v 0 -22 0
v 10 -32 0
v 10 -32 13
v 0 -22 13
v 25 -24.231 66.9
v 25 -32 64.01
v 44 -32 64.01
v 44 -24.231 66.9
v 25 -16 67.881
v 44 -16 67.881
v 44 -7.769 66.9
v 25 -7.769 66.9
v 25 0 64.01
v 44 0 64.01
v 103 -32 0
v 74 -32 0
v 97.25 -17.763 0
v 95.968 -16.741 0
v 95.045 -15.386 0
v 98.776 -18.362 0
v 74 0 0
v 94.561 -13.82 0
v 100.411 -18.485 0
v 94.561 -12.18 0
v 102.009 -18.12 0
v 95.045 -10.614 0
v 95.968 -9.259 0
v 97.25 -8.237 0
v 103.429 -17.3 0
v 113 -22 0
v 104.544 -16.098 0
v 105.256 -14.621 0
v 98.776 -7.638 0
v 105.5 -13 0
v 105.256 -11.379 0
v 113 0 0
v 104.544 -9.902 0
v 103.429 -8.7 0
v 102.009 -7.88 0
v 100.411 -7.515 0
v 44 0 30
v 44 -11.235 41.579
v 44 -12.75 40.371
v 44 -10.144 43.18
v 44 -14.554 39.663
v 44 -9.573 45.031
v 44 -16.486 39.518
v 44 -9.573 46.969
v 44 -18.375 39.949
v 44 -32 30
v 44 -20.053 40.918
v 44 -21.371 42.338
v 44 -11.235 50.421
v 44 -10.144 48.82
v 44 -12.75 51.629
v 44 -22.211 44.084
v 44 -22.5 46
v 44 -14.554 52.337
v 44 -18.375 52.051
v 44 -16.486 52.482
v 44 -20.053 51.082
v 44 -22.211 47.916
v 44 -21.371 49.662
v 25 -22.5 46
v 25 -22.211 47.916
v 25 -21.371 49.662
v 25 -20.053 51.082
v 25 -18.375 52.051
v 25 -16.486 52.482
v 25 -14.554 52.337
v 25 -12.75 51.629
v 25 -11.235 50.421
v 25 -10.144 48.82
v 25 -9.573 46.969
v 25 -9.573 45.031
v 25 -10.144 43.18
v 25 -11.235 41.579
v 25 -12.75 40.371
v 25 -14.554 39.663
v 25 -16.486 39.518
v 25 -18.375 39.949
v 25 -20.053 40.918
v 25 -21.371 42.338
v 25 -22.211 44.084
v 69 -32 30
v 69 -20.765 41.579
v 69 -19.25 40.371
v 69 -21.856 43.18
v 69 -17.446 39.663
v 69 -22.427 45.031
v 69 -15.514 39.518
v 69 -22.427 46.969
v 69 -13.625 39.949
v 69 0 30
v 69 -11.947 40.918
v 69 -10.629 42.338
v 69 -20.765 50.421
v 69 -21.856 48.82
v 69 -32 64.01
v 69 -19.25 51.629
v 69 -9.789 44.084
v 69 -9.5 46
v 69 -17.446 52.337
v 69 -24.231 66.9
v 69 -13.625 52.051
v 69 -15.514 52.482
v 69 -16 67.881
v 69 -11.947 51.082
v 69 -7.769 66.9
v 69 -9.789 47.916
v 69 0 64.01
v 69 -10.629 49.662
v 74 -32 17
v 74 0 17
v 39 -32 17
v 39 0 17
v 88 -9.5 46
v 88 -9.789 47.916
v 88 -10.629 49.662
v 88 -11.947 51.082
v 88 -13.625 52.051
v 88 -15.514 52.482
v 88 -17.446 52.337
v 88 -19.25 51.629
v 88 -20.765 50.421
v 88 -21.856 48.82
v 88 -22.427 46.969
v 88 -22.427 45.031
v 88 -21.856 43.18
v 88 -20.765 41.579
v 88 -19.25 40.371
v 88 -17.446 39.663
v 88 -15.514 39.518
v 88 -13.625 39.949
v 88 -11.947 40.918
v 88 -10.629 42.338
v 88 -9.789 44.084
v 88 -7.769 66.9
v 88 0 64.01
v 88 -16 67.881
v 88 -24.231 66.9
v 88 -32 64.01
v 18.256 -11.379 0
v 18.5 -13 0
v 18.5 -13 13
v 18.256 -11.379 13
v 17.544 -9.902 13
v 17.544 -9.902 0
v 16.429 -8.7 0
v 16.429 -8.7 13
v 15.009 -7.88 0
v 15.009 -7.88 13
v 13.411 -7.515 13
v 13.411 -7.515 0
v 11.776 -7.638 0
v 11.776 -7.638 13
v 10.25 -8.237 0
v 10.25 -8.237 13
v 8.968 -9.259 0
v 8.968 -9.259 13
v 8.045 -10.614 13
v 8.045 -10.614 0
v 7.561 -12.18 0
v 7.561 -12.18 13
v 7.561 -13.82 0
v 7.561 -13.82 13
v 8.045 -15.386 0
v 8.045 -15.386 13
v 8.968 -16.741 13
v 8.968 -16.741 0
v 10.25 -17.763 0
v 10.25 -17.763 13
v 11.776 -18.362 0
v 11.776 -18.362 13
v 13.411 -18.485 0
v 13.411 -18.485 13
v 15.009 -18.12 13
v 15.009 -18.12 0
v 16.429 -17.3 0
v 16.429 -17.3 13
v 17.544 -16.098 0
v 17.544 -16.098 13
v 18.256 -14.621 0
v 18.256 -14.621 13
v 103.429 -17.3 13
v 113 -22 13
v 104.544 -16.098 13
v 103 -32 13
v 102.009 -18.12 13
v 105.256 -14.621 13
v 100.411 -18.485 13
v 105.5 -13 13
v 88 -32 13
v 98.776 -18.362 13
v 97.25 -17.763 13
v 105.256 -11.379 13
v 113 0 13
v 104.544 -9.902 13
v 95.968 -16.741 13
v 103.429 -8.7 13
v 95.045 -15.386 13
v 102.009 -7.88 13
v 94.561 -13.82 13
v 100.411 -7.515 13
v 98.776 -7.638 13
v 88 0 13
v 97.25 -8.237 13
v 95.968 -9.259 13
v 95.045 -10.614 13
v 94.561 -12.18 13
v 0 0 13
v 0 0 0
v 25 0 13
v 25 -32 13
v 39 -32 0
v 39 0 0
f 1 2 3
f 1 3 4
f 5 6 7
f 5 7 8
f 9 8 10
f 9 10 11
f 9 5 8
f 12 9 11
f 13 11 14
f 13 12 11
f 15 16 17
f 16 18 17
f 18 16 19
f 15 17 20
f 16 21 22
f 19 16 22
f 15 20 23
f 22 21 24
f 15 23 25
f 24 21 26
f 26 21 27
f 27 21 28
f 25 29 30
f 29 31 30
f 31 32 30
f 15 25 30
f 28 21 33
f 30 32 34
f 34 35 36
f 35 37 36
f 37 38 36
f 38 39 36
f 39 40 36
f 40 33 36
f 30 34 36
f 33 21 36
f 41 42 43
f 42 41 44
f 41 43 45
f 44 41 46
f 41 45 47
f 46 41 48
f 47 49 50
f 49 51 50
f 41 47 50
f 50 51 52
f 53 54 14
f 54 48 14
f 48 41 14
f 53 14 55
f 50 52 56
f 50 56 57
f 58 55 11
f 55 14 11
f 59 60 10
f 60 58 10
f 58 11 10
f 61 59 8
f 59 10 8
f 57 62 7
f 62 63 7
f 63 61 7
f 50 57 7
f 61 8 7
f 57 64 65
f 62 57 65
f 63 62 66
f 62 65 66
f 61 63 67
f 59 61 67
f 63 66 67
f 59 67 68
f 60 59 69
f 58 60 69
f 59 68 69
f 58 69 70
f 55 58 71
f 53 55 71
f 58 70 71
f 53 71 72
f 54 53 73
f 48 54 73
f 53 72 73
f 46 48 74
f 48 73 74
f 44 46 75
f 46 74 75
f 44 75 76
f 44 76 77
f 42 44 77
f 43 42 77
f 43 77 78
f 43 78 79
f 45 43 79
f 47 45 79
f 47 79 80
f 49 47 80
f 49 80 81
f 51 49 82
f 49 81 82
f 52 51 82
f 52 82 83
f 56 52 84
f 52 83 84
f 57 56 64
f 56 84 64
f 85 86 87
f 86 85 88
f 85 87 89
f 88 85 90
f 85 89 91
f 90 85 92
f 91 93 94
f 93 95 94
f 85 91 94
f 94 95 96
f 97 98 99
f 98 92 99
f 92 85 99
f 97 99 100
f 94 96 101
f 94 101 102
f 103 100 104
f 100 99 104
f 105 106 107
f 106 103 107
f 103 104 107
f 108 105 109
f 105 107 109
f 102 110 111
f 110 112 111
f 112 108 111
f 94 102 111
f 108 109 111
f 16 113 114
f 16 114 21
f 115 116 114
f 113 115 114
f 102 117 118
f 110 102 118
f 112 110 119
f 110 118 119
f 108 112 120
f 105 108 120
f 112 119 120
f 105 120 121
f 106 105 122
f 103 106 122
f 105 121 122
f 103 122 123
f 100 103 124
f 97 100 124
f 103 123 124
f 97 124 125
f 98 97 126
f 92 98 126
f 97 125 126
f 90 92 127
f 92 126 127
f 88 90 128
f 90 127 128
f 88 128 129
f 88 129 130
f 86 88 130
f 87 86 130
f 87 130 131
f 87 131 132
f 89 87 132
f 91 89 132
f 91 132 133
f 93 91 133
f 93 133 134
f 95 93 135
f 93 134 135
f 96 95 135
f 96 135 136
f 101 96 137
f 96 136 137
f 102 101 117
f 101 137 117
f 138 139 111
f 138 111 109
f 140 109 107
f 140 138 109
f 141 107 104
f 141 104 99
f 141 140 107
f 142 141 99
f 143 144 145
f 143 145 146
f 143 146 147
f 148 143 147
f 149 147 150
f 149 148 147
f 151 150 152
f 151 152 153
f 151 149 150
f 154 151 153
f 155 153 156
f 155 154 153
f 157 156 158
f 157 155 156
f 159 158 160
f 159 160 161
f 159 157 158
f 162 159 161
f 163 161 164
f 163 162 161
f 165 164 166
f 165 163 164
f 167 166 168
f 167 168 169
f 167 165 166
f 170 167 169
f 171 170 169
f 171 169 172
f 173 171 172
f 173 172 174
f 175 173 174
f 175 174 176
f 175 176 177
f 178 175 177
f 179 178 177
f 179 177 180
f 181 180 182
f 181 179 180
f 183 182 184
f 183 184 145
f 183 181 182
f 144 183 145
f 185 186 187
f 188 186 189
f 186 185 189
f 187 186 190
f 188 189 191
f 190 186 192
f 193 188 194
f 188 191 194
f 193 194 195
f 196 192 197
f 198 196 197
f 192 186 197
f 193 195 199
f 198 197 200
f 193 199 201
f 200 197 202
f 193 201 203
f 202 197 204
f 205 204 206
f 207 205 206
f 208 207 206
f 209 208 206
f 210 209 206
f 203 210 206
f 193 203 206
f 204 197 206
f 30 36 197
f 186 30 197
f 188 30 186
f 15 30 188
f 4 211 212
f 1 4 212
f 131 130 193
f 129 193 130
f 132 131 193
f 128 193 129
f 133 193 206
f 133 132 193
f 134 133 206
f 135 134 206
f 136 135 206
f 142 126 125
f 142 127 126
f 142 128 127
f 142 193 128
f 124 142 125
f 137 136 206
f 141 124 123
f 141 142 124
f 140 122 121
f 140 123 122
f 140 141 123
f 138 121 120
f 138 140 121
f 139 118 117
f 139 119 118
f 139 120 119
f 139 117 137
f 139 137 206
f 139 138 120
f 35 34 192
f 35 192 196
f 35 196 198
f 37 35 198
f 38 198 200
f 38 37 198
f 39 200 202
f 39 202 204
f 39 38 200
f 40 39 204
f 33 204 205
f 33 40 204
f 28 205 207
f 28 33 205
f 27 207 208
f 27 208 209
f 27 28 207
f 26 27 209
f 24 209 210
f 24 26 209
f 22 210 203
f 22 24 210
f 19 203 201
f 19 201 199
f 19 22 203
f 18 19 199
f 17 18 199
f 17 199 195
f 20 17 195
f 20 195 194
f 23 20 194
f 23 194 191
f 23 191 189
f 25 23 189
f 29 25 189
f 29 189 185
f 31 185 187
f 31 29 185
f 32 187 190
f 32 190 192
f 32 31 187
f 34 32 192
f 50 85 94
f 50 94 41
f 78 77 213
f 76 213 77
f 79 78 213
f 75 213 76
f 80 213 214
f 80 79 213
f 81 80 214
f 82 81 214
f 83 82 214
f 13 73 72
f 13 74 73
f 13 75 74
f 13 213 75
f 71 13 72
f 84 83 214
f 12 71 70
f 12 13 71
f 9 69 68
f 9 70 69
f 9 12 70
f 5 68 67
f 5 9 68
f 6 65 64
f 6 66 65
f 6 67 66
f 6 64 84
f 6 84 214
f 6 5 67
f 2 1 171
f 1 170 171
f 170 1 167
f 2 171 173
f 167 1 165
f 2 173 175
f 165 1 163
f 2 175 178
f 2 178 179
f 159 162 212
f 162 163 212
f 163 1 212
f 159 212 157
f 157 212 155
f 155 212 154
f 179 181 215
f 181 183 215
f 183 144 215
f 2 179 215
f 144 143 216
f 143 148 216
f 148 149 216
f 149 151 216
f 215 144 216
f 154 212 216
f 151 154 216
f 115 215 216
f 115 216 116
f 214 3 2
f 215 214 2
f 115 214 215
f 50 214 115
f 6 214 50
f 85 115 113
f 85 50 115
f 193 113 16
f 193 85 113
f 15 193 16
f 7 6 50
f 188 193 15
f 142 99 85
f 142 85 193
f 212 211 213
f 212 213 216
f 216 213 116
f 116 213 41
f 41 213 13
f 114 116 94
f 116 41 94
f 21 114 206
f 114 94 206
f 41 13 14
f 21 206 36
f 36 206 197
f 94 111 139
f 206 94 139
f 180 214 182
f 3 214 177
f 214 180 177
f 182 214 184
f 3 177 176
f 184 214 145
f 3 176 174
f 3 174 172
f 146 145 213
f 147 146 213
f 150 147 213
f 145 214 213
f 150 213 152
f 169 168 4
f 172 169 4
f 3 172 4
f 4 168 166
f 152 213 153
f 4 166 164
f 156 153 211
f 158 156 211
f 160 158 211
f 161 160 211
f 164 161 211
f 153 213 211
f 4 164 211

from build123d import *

# Parameters (mm, degrees)
F1_DEPTH  = 32
F2_R      = 6.5
F3_DEPTH  = 19
F4_R      = 6.5
F5_DEPTH  = 19
F7_DEPTH  = 13
F8_R      = 5.5
F9_DEPTH  = 13
F11_DEPTH = 19
F13_DEPTH = 19


with BuildPart() as f1:
    # F0 (on Front) → F1 (new body)
    with BuildSketch(Plane.XZ):
        Polygon((0, 13), (0, 0), (39, 0), (39, 17), (74, 17), (74, 0), (113, 0), (113, 13), (88, 13), (88, 64.010125), (69, 64.010125), (69, 30), (44, 30), (44, 64.010125), (25, 64.010125), (25, 13), align=None)
    extrude(amount=F1_DEPTH)

    # F2 (on face) → F3 (cut, through all)
    with BuildSketch(Plane.YZ.offset(88)):
        with Locations((-16, 46)):
            Circle(F2_R)
    extrude(amount=-F3_DEPTH, mode=Mode.SUBTRACT)

    # F4 (on face) → F5 (cut, through all)
    with BuildSketch(Plane(origin=(25, 0, 0), x_dir=(0, -1, 0), z_dir=(-1, 0, 0))):
        with Locations((16, 46)):
            Circle(F4_R)
    extrude(amount=-F5_DEPTH, mode=Mode.SUBTRACT)

    # F6 (on Top) → F7 (cut, through all)
    with BuildSketch(Plane.XY):
        Polygon((0, -22), (0, -32), (10, -32), align=None)
        Polygon((113, -22), (103, -32), (113, -32), align=None)
    extrude(amount=F7_DEPTH, mode=Mode.SUBTRACT)

    # F8 (on Top) → F9 (cut, through all)
    with BuildSketch(Plane.XY):
        with Locations((13, -13)):
            Circle(F8_R)
        with Locations((100, -13)):
            Circle(F8_R)
    extrude(amount=F9_DEPTH, mode=Mode.SUBTRACT)

    # F10 (on face) → F11 (join)
    with BuildSketch(Plane.YZ.offset(88)):
        with BuildLine():
            Line((-32, 64.010125), (0, 64.010125))
            ThreePointArc((0, 64.010125), (-16, 67.88136), (-32, 64.010125))
        make_face()
    extrude(amount=-F11_DEPTH)

    # F12 (on face) → F13 (join)
    with BuildSketch(Plane(origin=(25, 0, 0), x_dir=(0, -1, 0), z_dir=(-1, 0, 0))):
        with BuildLine():
            Line((0, 64.010125), (32, 64.010125))
            ThreePointArc((32, 64.010125), (16, 67.88136), (0, 64.010125))
        make_face()
    extrude(amount=-F13_DEPTH)


solid = f1.part
